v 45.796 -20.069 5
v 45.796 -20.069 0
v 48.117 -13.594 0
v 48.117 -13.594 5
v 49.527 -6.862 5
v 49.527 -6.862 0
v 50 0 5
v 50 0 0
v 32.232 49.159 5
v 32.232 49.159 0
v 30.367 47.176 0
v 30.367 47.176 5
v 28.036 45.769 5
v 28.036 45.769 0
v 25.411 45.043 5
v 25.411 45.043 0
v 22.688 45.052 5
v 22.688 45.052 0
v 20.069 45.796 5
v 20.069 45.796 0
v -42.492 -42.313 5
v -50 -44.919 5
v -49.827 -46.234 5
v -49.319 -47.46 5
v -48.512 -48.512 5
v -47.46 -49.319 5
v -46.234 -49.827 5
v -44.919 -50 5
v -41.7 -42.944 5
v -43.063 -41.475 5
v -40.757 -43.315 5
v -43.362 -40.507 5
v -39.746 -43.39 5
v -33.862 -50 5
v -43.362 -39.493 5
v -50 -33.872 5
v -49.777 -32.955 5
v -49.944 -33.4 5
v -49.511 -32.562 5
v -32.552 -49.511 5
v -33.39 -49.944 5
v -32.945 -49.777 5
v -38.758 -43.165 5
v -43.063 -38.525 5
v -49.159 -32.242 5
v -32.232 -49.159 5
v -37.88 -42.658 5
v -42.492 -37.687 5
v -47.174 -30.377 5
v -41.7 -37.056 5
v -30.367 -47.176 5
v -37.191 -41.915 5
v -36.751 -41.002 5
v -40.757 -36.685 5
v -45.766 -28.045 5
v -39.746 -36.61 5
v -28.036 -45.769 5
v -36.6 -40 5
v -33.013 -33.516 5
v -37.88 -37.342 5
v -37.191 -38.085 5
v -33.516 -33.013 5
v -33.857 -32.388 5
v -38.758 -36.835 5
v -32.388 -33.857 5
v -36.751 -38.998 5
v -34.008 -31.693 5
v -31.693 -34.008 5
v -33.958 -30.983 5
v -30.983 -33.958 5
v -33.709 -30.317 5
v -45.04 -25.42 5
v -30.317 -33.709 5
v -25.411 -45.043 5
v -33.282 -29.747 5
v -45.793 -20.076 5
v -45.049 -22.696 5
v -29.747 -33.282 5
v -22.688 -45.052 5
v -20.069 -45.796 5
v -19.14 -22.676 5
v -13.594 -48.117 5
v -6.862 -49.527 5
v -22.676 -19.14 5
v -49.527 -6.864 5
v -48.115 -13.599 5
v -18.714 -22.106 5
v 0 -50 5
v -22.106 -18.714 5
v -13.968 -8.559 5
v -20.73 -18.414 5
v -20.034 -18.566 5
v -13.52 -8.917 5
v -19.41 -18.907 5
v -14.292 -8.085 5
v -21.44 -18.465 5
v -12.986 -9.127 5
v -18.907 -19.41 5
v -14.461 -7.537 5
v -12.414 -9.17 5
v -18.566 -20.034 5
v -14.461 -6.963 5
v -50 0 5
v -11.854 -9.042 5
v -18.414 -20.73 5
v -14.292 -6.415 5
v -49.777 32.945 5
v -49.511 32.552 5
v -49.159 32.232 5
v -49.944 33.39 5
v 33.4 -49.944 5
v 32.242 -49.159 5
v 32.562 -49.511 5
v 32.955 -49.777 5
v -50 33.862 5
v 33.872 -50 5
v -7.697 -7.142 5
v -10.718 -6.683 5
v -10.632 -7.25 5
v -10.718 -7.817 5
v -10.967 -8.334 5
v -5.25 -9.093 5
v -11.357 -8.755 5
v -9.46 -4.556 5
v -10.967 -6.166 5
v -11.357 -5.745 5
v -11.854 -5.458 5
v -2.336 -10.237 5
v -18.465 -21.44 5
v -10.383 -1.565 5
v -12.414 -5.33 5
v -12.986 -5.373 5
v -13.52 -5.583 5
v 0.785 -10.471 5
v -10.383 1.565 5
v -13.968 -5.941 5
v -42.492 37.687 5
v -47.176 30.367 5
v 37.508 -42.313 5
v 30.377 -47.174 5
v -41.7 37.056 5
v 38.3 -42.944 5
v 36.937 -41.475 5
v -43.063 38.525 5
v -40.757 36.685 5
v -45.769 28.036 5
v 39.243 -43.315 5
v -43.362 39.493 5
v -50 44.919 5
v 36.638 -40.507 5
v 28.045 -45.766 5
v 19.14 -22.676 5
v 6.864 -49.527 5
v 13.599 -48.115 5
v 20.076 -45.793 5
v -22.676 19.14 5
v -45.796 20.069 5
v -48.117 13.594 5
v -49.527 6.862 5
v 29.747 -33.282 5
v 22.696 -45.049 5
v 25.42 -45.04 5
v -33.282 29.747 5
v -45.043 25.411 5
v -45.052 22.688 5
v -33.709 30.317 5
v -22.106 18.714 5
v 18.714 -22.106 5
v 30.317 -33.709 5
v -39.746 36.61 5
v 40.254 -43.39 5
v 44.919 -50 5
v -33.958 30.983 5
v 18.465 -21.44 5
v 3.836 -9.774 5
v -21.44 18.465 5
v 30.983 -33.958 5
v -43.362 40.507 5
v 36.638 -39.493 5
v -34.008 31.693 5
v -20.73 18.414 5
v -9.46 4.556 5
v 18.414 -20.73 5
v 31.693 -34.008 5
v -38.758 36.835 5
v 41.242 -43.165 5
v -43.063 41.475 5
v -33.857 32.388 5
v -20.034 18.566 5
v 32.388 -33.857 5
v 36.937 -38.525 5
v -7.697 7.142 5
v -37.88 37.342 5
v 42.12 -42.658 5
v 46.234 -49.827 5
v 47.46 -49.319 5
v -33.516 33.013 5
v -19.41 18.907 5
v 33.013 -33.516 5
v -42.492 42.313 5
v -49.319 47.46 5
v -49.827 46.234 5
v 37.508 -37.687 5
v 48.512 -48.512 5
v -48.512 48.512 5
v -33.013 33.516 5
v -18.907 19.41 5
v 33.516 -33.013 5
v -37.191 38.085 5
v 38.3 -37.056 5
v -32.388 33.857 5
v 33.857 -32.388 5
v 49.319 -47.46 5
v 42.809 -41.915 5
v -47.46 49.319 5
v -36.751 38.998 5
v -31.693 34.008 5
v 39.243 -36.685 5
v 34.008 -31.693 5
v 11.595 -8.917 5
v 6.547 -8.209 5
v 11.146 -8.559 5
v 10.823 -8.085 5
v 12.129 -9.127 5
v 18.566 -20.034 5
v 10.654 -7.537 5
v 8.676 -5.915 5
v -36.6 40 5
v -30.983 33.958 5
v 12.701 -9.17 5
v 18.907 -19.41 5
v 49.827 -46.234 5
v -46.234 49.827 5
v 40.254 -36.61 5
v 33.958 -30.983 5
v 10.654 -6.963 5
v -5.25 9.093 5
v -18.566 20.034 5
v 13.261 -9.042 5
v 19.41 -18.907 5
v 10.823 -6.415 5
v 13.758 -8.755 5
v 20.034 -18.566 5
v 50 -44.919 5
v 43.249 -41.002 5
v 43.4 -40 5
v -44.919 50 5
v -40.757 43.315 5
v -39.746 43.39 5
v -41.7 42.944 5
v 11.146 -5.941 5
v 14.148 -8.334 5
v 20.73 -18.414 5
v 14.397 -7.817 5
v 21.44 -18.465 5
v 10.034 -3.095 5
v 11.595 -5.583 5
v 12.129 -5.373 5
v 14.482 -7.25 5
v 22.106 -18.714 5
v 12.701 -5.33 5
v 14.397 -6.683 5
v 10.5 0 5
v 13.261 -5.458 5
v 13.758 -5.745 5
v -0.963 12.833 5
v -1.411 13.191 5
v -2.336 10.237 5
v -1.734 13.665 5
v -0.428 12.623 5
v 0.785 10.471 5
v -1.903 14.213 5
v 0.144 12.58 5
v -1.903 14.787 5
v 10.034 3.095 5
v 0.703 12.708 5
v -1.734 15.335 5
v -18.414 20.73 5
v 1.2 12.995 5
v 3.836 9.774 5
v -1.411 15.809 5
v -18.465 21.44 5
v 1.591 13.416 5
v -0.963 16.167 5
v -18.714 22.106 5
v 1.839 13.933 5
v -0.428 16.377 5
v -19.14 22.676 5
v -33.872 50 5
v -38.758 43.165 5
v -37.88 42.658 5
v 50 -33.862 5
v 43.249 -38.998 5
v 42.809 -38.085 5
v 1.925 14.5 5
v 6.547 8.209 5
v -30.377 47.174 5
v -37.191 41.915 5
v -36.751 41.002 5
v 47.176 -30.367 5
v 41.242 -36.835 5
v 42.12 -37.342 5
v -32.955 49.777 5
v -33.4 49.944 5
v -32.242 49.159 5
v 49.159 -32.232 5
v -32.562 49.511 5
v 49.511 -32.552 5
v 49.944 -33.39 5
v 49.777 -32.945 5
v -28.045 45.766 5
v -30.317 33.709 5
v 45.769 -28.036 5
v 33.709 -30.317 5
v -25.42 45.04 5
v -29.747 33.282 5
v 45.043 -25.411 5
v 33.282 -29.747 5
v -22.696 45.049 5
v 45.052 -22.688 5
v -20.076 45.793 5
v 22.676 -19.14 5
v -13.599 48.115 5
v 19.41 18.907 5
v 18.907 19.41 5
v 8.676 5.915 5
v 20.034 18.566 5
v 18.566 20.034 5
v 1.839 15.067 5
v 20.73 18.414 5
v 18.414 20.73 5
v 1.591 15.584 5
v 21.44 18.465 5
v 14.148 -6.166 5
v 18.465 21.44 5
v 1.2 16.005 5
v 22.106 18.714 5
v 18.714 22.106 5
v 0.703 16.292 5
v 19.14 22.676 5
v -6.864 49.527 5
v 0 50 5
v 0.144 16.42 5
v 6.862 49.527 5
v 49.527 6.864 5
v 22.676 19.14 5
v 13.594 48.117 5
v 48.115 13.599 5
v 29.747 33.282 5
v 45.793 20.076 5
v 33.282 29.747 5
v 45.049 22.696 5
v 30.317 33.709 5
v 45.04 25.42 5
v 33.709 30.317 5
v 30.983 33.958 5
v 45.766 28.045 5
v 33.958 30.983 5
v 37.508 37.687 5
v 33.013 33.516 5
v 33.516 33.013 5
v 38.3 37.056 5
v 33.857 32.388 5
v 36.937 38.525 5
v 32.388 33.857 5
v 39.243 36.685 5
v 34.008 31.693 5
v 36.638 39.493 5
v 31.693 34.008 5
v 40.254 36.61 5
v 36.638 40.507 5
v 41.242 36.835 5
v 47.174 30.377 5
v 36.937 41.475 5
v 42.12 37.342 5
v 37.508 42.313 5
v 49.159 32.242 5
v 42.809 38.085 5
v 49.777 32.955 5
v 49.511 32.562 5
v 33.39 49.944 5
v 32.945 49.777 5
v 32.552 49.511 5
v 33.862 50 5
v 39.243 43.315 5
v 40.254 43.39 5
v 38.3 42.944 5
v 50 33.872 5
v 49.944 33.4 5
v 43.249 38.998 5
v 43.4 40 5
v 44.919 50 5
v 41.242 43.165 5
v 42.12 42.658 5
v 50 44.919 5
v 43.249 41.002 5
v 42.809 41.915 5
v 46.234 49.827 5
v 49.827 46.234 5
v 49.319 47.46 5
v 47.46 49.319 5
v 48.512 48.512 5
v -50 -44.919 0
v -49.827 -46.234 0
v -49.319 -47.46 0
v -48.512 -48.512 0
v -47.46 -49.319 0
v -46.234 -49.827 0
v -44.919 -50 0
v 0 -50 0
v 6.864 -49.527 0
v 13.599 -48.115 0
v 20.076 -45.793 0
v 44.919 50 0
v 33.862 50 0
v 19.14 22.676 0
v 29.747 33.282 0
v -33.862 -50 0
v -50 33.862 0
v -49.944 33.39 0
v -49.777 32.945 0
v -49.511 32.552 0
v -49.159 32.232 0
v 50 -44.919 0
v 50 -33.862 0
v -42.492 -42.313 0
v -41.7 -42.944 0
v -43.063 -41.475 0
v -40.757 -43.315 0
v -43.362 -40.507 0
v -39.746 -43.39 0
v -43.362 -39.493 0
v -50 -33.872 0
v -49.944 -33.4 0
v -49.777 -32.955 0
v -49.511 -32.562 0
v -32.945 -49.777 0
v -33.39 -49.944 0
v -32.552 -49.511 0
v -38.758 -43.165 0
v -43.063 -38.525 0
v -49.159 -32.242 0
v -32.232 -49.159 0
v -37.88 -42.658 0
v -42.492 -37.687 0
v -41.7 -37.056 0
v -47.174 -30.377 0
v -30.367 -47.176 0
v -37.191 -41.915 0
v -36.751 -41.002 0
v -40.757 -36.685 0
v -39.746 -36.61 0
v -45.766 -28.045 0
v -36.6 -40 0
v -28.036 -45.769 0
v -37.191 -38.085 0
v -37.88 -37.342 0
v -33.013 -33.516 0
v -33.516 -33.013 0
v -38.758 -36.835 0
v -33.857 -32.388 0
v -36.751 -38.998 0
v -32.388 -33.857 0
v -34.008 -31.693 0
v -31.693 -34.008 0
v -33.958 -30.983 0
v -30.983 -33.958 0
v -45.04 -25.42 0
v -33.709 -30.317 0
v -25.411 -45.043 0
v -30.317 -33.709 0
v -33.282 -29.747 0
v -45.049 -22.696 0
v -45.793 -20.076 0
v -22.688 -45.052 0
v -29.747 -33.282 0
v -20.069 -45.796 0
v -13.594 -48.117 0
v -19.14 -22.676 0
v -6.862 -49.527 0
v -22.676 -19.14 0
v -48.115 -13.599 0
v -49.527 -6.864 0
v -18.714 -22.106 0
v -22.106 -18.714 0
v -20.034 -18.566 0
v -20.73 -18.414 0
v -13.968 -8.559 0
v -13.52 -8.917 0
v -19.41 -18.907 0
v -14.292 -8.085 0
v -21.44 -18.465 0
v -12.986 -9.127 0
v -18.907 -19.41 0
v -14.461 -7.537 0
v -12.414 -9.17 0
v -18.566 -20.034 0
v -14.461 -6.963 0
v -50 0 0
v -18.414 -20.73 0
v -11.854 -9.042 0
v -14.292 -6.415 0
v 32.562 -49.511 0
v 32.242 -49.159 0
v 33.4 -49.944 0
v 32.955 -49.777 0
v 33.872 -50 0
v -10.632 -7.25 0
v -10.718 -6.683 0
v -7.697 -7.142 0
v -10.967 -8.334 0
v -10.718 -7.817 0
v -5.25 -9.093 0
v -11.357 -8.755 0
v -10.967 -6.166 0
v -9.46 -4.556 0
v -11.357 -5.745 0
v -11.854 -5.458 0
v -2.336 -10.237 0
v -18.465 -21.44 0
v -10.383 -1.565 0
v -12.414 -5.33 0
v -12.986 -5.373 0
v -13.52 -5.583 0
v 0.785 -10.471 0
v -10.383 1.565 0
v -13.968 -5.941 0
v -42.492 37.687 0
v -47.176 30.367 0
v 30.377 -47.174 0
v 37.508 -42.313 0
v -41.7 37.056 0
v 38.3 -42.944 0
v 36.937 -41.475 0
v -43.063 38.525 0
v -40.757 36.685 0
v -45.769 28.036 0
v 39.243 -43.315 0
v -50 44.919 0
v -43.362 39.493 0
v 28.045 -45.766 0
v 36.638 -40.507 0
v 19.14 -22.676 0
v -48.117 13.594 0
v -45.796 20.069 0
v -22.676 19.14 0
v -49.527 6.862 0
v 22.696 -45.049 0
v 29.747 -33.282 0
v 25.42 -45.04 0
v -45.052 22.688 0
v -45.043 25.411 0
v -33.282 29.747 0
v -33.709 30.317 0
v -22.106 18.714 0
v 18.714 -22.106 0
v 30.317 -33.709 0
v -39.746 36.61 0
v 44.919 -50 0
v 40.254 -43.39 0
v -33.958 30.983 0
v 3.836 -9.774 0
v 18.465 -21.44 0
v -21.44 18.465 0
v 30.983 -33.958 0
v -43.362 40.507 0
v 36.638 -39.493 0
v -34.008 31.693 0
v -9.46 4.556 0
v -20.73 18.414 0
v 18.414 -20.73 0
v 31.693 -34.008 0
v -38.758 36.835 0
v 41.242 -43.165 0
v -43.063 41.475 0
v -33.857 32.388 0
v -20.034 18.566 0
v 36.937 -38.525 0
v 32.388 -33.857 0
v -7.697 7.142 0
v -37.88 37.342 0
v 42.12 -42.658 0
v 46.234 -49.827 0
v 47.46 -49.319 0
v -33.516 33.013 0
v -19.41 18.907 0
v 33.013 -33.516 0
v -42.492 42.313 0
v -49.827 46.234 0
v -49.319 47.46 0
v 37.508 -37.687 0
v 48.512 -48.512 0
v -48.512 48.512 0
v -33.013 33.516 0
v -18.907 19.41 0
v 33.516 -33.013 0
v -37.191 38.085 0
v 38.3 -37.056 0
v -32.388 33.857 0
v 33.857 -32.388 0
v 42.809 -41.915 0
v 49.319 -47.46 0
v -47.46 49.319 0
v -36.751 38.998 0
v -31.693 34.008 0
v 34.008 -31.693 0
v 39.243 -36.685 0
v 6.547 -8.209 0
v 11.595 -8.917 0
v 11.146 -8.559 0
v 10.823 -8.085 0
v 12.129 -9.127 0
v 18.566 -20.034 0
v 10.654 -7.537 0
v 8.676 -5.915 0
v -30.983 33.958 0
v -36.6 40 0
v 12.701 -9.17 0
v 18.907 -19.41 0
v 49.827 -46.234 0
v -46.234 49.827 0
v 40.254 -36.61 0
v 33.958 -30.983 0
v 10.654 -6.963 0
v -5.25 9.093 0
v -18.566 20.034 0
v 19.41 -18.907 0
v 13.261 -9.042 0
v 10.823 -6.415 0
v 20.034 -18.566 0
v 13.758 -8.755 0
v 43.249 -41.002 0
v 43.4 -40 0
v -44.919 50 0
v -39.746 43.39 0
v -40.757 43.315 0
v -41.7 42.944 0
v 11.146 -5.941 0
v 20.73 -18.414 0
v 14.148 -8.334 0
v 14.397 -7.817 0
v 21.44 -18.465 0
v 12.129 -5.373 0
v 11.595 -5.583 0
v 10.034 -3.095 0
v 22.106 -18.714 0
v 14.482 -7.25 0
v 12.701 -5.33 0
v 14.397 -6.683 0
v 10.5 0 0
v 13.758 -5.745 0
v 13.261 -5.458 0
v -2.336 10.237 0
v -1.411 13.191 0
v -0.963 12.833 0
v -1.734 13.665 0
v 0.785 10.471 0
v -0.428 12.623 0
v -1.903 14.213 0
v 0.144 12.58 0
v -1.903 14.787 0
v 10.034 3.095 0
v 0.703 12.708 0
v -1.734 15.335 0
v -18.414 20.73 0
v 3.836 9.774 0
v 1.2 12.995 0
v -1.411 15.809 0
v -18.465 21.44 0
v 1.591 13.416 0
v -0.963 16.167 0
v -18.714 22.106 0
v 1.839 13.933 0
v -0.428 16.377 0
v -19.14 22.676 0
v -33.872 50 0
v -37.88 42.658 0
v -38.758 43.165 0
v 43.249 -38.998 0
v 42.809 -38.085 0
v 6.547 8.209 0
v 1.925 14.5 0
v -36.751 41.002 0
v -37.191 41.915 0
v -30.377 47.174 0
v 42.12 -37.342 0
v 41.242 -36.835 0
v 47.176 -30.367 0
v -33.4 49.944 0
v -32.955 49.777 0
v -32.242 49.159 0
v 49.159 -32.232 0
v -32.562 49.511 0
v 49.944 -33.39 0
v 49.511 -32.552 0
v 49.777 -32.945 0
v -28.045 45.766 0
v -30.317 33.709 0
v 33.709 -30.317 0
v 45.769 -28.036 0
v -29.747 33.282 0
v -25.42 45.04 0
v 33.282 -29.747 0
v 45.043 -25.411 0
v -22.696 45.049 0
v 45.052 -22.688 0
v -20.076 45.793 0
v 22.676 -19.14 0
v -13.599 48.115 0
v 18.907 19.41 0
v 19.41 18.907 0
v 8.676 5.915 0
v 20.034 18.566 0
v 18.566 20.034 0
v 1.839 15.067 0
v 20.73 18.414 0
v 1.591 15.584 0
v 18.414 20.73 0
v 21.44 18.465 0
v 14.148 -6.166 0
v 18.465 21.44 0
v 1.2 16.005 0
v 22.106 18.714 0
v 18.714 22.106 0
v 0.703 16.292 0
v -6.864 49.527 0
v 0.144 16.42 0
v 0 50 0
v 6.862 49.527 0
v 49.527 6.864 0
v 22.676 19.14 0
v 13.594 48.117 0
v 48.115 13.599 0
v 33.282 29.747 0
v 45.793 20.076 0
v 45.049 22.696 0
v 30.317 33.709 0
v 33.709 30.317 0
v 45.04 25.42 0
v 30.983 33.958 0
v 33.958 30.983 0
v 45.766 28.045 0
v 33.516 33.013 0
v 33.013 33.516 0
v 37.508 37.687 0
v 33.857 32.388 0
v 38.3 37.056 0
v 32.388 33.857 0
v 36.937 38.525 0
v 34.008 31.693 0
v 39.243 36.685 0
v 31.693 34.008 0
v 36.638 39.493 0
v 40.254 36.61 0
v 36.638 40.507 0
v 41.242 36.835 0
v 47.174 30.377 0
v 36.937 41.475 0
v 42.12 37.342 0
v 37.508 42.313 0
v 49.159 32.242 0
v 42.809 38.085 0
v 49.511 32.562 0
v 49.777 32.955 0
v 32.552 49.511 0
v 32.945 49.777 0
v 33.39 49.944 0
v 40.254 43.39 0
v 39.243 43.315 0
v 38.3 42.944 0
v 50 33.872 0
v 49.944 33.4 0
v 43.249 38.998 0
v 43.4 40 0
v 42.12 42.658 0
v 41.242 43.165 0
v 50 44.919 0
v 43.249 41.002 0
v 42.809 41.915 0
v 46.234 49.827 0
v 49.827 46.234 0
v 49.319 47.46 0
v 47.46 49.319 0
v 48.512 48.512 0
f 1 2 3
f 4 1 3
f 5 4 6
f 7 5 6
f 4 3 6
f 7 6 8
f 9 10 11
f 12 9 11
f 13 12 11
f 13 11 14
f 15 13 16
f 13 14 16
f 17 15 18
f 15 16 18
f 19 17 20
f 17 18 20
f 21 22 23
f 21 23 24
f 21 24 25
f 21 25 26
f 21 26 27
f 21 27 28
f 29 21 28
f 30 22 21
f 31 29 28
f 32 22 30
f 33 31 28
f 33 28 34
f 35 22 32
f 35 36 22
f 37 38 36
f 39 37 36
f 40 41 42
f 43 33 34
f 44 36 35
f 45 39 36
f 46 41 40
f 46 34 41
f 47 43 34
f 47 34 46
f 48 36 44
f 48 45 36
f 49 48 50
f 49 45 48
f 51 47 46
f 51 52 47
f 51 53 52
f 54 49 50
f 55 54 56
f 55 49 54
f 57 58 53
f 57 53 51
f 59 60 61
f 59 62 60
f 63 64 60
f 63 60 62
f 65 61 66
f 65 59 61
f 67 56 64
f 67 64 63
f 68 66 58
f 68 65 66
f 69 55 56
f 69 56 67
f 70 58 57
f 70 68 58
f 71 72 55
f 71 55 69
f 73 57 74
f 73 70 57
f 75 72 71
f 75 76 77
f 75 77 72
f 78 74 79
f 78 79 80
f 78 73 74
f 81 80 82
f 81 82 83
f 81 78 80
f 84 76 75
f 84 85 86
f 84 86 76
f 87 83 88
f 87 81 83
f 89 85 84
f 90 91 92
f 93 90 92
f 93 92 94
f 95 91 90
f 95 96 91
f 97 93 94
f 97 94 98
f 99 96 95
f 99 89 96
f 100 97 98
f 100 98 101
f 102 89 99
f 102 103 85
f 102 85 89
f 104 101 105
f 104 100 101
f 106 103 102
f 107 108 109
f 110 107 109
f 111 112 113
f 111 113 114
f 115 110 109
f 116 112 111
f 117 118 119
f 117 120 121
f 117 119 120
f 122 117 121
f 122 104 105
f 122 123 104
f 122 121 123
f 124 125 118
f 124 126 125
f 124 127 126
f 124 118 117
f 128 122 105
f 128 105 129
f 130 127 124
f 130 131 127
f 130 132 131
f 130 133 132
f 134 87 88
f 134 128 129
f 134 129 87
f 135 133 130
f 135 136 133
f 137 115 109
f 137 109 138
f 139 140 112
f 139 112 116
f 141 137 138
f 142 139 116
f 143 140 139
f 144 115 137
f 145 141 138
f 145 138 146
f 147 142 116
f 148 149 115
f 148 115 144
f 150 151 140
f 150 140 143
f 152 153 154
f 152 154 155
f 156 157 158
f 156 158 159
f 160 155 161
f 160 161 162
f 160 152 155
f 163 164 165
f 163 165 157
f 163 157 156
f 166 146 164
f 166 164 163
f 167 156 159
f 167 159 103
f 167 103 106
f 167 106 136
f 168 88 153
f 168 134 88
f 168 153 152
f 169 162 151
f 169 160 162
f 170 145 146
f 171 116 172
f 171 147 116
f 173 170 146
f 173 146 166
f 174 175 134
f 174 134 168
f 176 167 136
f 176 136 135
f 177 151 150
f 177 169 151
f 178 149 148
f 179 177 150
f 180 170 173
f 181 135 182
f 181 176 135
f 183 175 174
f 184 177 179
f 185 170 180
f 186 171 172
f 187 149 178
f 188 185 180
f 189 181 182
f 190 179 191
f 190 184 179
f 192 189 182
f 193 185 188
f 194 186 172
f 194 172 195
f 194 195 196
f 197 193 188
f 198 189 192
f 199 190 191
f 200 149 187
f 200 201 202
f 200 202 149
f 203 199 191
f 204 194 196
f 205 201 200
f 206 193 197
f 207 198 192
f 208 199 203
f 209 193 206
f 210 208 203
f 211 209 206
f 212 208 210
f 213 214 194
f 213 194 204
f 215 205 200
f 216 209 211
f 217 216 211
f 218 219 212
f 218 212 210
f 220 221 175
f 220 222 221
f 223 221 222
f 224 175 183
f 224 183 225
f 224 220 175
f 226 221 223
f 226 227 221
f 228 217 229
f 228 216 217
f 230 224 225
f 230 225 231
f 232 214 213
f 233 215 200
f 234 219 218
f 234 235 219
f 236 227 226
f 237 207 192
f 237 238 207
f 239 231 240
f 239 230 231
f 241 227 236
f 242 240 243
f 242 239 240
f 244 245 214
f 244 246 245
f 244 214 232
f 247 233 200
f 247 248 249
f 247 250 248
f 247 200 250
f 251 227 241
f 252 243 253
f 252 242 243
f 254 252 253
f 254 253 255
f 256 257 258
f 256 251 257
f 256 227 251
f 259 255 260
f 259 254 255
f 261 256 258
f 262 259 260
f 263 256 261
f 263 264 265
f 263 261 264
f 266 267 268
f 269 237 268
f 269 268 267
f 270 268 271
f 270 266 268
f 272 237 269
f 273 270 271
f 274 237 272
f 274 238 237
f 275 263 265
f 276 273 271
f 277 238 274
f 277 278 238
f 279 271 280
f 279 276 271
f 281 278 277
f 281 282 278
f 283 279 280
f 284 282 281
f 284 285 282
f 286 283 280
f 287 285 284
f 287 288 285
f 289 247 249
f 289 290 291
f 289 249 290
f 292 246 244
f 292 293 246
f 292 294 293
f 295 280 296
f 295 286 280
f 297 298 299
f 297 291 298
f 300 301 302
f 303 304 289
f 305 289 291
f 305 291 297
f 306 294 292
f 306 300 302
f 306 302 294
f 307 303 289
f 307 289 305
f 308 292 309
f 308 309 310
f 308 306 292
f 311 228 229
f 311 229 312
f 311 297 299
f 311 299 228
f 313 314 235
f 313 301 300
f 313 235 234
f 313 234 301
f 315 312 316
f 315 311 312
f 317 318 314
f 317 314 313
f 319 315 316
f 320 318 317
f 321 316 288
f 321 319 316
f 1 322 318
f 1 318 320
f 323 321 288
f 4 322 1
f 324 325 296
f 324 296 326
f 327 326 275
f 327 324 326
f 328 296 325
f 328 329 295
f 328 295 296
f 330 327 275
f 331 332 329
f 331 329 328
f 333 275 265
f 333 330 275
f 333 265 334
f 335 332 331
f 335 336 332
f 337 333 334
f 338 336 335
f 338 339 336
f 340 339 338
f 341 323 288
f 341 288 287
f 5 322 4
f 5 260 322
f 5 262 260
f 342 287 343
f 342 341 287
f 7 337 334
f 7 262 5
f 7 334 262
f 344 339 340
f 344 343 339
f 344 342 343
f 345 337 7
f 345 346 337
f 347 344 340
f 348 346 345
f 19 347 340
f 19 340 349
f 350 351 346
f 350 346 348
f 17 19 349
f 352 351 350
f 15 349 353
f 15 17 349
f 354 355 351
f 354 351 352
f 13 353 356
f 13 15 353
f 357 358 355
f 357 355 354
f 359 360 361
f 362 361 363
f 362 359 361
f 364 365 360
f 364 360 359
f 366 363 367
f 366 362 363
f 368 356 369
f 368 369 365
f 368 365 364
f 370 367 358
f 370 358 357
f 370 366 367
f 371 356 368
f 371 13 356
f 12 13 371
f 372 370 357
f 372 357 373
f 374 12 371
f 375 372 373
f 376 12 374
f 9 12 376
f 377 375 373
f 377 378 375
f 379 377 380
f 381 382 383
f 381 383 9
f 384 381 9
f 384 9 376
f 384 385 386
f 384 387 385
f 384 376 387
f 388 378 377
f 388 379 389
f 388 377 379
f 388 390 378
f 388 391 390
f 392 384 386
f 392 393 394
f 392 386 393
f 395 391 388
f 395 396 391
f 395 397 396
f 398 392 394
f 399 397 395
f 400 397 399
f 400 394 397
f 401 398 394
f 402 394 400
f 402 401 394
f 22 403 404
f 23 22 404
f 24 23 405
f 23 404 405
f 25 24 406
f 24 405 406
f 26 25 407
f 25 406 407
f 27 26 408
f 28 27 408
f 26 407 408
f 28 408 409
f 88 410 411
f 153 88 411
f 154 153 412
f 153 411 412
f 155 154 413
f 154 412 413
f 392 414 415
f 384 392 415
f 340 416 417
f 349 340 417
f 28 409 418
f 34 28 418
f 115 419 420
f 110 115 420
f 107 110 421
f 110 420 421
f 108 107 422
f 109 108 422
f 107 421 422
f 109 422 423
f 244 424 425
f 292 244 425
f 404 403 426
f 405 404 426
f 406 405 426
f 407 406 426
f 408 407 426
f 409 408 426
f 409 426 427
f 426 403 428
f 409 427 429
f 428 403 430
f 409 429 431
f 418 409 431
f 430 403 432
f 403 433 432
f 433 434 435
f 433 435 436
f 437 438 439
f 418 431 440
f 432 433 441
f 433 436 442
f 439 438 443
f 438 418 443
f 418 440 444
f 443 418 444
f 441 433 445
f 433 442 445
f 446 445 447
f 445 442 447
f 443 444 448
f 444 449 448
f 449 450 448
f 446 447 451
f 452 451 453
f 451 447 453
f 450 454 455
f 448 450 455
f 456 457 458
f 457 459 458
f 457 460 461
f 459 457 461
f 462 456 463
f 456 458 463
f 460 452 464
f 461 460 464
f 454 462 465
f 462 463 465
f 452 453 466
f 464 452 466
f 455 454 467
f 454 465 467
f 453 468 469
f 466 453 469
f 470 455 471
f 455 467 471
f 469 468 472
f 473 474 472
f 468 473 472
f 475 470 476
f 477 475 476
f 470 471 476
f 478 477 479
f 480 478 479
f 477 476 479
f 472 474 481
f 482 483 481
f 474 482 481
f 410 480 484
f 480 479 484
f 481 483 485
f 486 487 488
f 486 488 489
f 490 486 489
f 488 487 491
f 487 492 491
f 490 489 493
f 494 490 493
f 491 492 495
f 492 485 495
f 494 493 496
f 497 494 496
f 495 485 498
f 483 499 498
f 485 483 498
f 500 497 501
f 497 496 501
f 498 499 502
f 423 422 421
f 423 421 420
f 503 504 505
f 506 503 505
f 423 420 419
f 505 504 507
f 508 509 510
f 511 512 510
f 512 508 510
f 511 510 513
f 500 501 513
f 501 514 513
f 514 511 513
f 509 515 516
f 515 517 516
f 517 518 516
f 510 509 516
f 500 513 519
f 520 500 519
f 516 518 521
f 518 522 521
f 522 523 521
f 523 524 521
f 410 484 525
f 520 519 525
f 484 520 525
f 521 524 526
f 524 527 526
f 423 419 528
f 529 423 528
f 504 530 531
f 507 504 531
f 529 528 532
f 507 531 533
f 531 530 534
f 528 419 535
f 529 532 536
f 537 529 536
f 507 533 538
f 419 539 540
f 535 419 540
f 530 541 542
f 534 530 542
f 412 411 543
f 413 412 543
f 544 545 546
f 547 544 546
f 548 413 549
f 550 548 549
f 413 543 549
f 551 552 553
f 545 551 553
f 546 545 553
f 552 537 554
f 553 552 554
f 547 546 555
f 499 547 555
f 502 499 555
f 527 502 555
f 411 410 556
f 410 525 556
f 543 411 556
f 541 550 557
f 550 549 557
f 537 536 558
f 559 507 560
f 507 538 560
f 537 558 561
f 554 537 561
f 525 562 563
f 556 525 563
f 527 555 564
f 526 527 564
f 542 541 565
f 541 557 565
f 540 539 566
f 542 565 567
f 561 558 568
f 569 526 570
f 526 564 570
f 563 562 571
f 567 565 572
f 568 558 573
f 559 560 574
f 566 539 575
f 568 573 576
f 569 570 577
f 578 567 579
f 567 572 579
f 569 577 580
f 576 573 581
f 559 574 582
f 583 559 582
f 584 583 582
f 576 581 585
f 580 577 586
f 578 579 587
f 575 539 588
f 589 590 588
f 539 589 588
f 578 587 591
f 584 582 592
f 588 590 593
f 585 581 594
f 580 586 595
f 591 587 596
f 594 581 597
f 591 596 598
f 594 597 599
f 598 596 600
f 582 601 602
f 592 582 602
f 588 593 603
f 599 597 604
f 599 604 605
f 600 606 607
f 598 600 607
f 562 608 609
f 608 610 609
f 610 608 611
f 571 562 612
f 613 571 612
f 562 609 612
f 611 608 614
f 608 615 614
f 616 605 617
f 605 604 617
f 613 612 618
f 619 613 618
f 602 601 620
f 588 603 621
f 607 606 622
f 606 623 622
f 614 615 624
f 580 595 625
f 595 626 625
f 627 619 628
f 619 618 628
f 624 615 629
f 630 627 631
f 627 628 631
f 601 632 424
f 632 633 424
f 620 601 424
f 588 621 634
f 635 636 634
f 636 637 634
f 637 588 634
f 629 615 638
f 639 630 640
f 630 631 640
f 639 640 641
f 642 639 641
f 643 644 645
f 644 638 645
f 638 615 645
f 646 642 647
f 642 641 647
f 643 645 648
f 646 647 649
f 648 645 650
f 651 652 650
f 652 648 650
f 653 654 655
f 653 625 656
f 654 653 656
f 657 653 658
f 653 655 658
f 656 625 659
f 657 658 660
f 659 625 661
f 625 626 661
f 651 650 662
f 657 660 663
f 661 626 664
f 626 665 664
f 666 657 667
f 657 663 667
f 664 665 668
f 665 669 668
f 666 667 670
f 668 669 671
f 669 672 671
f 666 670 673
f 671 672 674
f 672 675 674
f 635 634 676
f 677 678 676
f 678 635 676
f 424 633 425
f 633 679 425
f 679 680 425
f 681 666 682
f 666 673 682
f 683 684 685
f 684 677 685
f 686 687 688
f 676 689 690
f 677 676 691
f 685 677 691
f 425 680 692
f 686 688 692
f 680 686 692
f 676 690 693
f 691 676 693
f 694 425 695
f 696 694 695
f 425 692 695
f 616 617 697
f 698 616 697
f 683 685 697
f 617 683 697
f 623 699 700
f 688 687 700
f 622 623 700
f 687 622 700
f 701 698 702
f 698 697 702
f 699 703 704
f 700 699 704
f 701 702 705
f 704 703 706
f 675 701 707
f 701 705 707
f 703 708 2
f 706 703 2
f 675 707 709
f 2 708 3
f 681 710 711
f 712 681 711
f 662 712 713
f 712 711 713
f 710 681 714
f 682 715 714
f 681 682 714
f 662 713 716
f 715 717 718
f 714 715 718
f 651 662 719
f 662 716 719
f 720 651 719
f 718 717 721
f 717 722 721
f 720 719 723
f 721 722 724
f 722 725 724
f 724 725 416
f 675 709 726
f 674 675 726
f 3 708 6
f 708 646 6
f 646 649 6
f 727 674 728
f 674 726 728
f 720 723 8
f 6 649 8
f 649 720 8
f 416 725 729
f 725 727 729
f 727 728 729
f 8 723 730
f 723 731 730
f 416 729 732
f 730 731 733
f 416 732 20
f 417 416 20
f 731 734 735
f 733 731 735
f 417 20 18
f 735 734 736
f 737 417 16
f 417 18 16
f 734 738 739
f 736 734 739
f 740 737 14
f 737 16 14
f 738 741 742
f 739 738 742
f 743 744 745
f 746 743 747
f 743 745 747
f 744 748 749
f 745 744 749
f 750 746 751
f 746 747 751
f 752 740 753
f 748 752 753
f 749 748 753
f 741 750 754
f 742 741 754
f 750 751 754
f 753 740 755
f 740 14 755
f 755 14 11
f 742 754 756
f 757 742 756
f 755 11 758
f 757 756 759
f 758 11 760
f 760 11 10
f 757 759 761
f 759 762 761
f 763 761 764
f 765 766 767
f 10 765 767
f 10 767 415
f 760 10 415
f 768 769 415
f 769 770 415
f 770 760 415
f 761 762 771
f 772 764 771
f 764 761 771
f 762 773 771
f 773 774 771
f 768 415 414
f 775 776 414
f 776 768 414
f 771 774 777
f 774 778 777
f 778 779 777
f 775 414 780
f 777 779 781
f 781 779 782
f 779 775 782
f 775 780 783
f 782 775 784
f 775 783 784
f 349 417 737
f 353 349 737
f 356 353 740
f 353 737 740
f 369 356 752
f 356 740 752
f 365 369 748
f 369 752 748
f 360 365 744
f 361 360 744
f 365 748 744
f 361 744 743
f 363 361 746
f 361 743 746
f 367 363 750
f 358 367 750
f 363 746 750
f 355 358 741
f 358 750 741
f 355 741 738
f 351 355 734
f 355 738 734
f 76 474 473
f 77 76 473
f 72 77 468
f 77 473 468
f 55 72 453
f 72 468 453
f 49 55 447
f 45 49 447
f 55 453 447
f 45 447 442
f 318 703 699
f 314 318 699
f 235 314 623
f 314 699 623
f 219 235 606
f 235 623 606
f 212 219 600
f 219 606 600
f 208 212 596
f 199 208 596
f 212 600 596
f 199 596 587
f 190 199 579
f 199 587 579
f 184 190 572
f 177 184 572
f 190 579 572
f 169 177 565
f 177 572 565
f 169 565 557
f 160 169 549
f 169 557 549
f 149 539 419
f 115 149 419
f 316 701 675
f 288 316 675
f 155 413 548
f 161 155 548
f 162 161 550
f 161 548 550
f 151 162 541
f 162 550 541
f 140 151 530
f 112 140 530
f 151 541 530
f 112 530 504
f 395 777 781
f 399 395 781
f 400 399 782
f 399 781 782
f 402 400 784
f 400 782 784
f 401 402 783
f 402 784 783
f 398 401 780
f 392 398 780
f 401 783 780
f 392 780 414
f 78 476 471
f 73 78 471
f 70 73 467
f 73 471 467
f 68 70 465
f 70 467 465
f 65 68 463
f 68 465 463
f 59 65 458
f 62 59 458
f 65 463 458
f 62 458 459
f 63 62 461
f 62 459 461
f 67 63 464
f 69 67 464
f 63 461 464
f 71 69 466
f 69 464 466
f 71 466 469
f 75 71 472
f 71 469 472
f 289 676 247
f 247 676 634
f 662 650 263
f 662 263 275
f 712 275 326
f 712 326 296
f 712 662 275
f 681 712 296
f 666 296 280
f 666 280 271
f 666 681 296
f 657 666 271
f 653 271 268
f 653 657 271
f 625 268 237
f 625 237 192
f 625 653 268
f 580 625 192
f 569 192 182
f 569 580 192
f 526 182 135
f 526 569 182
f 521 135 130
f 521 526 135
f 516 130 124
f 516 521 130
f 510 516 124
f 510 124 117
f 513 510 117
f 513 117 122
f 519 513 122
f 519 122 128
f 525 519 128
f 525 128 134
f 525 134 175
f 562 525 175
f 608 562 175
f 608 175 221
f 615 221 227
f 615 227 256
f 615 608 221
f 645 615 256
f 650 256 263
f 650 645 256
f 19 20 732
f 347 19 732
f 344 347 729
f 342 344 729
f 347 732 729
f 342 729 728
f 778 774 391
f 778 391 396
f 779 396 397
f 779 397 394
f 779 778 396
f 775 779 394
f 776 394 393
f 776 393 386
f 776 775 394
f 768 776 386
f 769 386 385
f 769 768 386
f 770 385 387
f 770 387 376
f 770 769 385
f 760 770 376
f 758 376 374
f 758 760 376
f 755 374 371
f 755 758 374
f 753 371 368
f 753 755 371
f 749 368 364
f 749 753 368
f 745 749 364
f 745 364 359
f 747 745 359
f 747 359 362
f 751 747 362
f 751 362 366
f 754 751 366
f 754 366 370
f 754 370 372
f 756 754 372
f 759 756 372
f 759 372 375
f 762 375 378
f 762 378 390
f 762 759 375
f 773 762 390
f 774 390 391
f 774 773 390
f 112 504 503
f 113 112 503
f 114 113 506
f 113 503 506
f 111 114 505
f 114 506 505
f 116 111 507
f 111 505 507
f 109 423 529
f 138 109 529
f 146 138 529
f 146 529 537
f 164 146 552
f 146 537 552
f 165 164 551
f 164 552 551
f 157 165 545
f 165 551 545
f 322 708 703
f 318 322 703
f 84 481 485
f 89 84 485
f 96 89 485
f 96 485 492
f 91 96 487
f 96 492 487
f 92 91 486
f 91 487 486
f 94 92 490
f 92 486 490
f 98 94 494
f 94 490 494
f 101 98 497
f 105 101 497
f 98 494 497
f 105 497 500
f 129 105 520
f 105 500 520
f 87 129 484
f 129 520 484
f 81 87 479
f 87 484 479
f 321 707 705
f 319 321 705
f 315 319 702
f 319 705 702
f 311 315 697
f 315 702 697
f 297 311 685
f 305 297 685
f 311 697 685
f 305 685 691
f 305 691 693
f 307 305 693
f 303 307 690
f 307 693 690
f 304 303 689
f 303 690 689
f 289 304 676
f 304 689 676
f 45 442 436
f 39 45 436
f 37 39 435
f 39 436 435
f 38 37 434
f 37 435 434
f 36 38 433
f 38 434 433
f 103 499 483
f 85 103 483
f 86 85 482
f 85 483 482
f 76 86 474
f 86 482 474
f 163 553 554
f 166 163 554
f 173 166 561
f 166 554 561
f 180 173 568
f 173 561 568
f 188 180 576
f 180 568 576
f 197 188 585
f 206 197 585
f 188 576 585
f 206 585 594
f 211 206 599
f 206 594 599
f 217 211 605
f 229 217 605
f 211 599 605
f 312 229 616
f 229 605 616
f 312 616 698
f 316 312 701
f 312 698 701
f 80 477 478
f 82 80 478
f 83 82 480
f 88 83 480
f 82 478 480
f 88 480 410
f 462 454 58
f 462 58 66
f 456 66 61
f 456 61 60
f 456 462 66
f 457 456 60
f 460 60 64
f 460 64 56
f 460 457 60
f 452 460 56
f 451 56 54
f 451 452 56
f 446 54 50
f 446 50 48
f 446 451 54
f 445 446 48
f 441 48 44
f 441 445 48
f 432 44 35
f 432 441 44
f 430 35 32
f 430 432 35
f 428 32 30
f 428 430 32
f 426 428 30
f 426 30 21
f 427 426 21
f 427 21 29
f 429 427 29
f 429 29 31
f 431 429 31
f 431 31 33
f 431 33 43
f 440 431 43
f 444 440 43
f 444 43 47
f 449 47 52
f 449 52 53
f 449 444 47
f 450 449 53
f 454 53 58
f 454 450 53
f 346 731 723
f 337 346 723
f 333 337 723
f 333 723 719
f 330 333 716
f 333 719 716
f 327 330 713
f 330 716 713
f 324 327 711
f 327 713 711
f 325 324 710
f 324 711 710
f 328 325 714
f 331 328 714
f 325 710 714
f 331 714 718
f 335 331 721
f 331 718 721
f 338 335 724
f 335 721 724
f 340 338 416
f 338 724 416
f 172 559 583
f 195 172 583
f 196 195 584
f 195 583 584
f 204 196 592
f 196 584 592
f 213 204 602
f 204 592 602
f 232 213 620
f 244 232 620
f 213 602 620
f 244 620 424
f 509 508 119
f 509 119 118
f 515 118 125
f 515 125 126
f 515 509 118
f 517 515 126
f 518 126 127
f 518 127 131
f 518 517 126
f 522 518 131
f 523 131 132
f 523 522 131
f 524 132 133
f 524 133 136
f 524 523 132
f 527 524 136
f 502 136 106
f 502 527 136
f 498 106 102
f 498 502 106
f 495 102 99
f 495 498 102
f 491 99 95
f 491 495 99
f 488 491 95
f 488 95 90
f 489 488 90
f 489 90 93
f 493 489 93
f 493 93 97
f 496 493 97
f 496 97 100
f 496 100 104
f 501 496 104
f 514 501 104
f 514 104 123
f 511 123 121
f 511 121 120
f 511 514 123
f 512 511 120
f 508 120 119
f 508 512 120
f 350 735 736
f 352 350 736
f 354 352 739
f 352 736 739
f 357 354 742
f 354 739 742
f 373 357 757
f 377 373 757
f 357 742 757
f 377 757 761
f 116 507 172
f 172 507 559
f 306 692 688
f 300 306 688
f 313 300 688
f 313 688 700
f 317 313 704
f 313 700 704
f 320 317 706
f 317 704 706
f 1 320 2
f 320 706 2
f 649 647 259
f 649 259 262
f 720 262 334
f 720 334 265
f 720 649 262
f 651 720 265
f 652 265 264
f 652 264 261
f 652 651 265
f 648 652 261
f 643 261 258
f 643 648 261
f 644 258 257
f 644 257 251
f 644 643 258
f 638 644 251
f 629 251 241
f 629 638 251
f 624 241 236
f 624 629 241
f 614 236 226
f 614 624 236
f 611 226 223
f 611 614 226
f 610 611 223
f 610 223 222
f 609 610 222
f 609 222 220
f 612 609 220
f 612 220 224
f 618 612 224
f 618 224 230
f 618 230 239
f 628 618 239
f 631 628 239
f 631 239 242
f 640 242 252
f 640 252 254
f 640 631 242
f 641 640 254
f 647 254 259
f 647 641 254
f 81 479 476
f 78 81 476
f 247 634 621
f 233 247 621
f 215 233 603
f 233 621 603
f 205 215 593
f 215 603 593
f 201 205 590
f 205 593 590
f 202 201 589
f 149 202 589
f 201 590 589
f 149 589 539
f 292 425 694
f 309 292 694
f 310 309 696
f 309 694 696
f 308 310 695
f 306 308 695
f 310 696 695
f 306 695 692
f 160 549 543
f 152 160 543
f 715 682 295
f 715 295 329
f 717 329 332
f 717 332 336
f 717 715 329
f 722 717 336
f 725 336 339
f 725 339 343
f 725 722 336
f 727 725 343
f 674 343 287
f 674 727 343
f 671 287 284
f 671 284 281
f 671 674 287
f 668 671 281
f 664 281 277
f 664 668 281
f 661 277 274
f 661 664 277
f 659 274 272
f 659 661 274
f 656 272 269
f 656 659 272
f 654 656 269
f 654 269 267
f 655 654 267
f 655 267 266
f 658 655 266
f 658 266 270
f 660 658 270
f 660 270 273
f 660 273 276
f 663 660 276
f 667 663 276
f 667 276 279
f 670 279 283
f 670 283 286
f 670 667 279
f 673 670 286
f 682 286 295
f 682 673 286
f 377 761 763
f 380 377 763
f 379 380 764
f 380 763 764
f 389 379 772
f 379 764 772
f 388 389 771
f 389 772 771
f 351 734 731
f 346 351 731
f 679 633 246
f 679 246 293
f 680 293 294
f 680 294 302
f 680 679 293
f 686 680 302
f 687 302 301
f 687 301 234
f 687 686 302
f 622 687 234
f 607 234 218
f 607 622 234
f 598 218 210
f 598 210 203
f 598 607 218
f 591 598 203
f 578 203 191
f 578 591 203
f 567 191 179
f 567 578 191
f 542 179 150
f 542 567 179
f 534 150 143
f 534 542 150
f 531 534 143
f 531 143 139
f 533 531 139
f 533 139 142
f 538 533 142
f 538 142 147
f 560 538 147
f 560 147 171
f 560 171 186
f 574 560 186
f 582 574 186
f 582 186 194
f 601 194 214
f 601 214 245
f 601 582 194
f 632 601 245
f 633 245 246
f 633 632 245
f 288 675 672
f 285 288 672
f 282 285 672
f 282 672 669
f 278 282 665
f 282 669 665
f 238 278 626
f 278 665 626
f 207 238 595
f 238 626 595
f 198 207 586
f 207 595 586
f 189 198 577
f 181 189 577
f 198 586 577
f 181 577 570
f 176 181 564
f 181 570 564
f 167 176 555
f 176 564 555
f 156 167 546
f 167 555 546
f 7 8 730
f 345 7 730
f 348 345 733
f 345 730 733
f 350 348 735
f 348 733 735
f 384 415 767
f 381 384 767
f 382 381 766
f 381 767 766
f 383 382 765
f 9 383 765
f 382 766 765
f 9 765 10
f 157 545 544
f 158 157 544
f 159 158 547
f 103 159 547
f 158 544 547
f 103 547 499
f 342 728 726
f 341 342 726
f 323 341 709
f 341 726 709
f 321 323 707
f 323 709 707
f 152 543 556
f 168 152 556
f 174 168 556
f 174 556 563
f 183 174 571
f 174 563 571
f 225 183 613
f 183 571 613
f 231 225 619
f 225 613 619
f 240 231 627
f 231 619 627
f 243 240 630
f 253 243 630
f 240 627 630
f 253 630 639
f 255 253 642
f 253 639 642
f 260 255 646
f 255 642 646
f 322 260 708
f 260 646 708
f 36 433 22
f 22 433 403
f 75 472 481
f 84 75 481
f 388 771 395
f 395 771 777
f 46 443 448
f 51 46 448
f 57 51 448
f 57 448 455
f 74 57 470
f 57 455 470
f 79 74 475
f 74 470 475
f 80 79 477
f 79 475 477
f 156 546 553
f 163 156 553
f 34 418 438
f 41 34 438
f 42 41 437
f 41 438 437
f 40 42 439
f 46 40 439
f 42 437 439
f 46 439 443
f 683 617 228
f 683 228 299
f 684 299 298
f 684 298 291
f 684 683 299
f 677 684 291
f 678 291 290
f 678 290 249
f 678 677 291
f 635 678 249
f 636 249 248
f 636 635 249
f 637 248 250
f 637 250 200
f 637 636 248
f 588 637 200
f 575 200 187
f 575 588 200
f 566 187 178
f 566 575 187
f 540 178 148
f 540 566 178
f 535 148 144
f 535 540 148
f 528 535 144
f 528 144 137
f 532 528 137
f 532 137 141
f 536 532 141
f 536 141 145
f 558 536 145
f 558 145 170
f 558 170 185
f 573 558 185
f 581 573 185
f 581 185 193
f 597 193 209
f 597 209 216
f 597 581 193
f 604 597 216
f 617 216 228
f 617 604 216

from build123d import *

# Parameters (mm, degrees)
ESQUISSE1_R        = 10.5
ESQUISSE1_R_2      = 3.4
ESQUISSE1_R_3      = 1.925
BOSS_EXTRU_2_DEPTH = 5


with BuildPart() as part:
    # Esquisse1 → Boss.-Extru.2 (new body)
    with BuildSketch(Plane.XY):
        with BuildLine():
            Line((50, -44.919487431), (50, -33.862050579))
            ThreePointArc((50, -33.862050579), (49.777389032, -32.945051), (49.159111773, -32.232185585))
            ThreePointArc((49.159111773, -32.232185585), (45.31641316, -26.748192273), (45.795558863, -20.069050512))
            ThreePointArc((45.795558863, -20.069050512), (48.937602838, -10.252366967), (50, 0))
            ThreePointArc((50, 0), (48.936869799, 10.255865358), (45.79268903, 20.075597908))
            ThreePointArc((45.79268903, 20.075597908), (45.313248124, 26.757056992), (49.158537806, 32.242082639))
            ThreePointArc((49.158537806, 32.242082639), (49.777227562, 32.955043184), (50, 33.872355669))
            Line((50, 33.872355669), (50, 44.919487431))
            ThreePointArc((50, 44.919487431), (48.51195232, 48.51195232), (44.919487431, 50))
            Line((44.919487431, 50), (33.862050579, 50))
            ThreePointArc((33.862050579, 50), (32.945051, 49.777389032), (32.232185585, 49.159111773))
            ThreePointArc((32.232185585, 49.159111773), (26.748192273, 45.31641316), (20.069050512, 45.795558863))
            ThreePointArc((20.069050512, 45.795558863), (10.252366967, 48.937602838), (0, 50))
            ThreePointArc((0, 50), (-10.255865358, 48.936869799), (-20.075597908, 45.79268903))
            ThreePointArc((-20.075597908, 45.79268903), (-26.757056992, 45.313248124), (-32.242082639, 49.158537806))
            ThreePointArc((-32.242082639, 49.158537806), (-32.955043184, 49.777227562), (-33.872355669, 50))
            Line((-33.872355669, 50), (-44.919487431, 50))
            ThreePointArc((-44.919487431, 50), (-48.51195232, 48.51195232), (-50, 44.919487431))
            Line((-50, 44.919487431), (-50, 33.862050579))
            ThreePointArc((-50, 33.862050579), (-49.777389032, 32.945051), (-49.159111773, 32.232185585))
            ThreePointArc((-49.159111773, 32.232185585), (-45.31641316, 26.748192273), (-45.795558863, 20.069050512))
            ThreePointArc((-45.795558863, 20.069050512), (-48.937602838, 10.252366967), (-50, 0))
            ThreePointArc((-50, 0), (-48.936869799, -10.255865358), (-45.79268903, -20.075597908))
            ThreePointArc((-45.79268903, -20.075597908), (-45.313248124, -26.757056992), (-49.158537806, -32.242082639))
            ThreePointArc((-49.158537806, -32.242082639), (-49.777227562, -32.955043184), (-50, -33.872355669))
            Line((-50, -33.872355669), (-50, -44.919487431))
            ThreePointArc((-50, -44.919487431), (-48.51195232, -48.51195232), (-44.919487431, -50))
            Line((-44.919487431, -50), (-33.862050579, -50))
            ThreePointArc((-33.862050579, -50), (-32.945051, -49.777389032), (-32.232185585, -49.159111773))
            ThreePointArc((-32.232185585, -49.159111773), (-26.748192273, -45.31641316), (-20.069050512, -45.795558863))
            ThreePointArc((-20.069050512, -45.795558863), (-10.252366967, -48.937602838), (0, -50))
            ThreePointArc((0, -50), (10.255865358, -48.936869799), (20.075597908, -45.79268903))
            ThreePointArc((20.075597908, -45.79268903), (26.757056992, -45.313248124), (32.242082639, -49.158537806))
            ThreePointArc((32.242082639, -49.158537806), (32.955043184, -49.777227562), (33.872355669, -50))
            Line((33.872355669, -50), (44.919487431, -50))
            ThreePointArc((44.919487431, -50), (48.51195232, -48.51195232), (50, -44.919487431))
        make_face()
        Circle(ESQUISSE1_R, mode=Mode.SUBTRACT)
        with Locations((40, -40)):
            Circle(ESQUISSE1_R_2, mode=Mode.SUBTRACT)
        with Locations((-40, -40)):
            Circle(ESQUISSE1_R_2, mode=Mode.SUBTRACT)
        with Locations((0, 14.5)):
            Circle(ESQUISSE1_R_3, mode=Mode.SUBTRACT)
        with Locations((40, 40)):
            Circle(ESQUISSE1_R_2, mode=Mode.SUBTRACT)
        with Locations((-40, 40)):
            Circle(ESQUISSE1_R_2, mode=Mode.SUBTRACT)
        with Locations((12.557368355, -7.25)):
            Circle(ESQUISSE1_R_3, mode=Mode.SUBTRACT)
        with Locations((-12.557368355, -7.25)):
            Circle(ESQUISSE1_R_3, mode=Mode.SUBTRACT)
        with BuildLine():
            Line((29.746951244, -33.28248515), (19.14034941, -22.675883316))
            ThreePointArc((19.14034941, -22.675883316), (19.14034941, -19.14034941), (22.675883316, -19.14034941))
            Line((22.675883316, -19.14034941), (33.282485034, -29.746951128))
            ThreePointArc((33.282485034, -29.746951128), (33.282485209, -33.282485092), (29.746951244, -33.28248515))
        make_face(mode=Mode.SUBTRACT)
        with BuildLine():
            Line((-33.28248515, -29.746951244), (-22.675883316, -19.14034941))
            ThreePointArc((-22.675883316, -19.14034941), (-19.14034941, -19.14034941), (-19.14034941, -22.675883316))
            Line((-19.14034941, -22.675883316), (-29.746951128, -33.282485034))
            ThreePointArc((-29.746951128, -33.282485034), (-33.282485092, -33.282485209), (-33.28248515, -29.746951244))
        make_face(mode=Mode.SUBTRACT)
        with BuildLine():
            Line((33.28248515, 29.746951244), (22.675883316, 19.14034941))
            ThreePointArc((22.675883316, 19.14034941), (19.14034941, 19.14034941), (19.14034941, 22.675883316))
            Line((19.14034941, 22.675883316), (29.746951128, 33.282485034))
            ThreePointArc((29.746951128, 33.282485034), (33.282485092, 33.282485209), (33.28248515, 29.746951244))
        make_face(mode=Mode.SUBTRACT)
        with BuildLine():
            Line((-29.746951244, 33.28248515), (-19.14034941, 22.675883316))
            ThreePointArc((-19.14034941, 22.675883316), (-19.14034941, 19.14034941), (-22.675883316, 19.14034941))
            Line((-22.675883316, 19.14034941), (-33.282485034, 29.746951128))
            ThreePointArc((-33.282485034, 29.746951128), (-33.282485209, 33.282485092), (-29.746951244, 33.28248515))
        make_face(mode=Mode.SUBTRACT)
    extrude(amount=BOSS_EXTRU_2_DEPTH)


solid = part.part
